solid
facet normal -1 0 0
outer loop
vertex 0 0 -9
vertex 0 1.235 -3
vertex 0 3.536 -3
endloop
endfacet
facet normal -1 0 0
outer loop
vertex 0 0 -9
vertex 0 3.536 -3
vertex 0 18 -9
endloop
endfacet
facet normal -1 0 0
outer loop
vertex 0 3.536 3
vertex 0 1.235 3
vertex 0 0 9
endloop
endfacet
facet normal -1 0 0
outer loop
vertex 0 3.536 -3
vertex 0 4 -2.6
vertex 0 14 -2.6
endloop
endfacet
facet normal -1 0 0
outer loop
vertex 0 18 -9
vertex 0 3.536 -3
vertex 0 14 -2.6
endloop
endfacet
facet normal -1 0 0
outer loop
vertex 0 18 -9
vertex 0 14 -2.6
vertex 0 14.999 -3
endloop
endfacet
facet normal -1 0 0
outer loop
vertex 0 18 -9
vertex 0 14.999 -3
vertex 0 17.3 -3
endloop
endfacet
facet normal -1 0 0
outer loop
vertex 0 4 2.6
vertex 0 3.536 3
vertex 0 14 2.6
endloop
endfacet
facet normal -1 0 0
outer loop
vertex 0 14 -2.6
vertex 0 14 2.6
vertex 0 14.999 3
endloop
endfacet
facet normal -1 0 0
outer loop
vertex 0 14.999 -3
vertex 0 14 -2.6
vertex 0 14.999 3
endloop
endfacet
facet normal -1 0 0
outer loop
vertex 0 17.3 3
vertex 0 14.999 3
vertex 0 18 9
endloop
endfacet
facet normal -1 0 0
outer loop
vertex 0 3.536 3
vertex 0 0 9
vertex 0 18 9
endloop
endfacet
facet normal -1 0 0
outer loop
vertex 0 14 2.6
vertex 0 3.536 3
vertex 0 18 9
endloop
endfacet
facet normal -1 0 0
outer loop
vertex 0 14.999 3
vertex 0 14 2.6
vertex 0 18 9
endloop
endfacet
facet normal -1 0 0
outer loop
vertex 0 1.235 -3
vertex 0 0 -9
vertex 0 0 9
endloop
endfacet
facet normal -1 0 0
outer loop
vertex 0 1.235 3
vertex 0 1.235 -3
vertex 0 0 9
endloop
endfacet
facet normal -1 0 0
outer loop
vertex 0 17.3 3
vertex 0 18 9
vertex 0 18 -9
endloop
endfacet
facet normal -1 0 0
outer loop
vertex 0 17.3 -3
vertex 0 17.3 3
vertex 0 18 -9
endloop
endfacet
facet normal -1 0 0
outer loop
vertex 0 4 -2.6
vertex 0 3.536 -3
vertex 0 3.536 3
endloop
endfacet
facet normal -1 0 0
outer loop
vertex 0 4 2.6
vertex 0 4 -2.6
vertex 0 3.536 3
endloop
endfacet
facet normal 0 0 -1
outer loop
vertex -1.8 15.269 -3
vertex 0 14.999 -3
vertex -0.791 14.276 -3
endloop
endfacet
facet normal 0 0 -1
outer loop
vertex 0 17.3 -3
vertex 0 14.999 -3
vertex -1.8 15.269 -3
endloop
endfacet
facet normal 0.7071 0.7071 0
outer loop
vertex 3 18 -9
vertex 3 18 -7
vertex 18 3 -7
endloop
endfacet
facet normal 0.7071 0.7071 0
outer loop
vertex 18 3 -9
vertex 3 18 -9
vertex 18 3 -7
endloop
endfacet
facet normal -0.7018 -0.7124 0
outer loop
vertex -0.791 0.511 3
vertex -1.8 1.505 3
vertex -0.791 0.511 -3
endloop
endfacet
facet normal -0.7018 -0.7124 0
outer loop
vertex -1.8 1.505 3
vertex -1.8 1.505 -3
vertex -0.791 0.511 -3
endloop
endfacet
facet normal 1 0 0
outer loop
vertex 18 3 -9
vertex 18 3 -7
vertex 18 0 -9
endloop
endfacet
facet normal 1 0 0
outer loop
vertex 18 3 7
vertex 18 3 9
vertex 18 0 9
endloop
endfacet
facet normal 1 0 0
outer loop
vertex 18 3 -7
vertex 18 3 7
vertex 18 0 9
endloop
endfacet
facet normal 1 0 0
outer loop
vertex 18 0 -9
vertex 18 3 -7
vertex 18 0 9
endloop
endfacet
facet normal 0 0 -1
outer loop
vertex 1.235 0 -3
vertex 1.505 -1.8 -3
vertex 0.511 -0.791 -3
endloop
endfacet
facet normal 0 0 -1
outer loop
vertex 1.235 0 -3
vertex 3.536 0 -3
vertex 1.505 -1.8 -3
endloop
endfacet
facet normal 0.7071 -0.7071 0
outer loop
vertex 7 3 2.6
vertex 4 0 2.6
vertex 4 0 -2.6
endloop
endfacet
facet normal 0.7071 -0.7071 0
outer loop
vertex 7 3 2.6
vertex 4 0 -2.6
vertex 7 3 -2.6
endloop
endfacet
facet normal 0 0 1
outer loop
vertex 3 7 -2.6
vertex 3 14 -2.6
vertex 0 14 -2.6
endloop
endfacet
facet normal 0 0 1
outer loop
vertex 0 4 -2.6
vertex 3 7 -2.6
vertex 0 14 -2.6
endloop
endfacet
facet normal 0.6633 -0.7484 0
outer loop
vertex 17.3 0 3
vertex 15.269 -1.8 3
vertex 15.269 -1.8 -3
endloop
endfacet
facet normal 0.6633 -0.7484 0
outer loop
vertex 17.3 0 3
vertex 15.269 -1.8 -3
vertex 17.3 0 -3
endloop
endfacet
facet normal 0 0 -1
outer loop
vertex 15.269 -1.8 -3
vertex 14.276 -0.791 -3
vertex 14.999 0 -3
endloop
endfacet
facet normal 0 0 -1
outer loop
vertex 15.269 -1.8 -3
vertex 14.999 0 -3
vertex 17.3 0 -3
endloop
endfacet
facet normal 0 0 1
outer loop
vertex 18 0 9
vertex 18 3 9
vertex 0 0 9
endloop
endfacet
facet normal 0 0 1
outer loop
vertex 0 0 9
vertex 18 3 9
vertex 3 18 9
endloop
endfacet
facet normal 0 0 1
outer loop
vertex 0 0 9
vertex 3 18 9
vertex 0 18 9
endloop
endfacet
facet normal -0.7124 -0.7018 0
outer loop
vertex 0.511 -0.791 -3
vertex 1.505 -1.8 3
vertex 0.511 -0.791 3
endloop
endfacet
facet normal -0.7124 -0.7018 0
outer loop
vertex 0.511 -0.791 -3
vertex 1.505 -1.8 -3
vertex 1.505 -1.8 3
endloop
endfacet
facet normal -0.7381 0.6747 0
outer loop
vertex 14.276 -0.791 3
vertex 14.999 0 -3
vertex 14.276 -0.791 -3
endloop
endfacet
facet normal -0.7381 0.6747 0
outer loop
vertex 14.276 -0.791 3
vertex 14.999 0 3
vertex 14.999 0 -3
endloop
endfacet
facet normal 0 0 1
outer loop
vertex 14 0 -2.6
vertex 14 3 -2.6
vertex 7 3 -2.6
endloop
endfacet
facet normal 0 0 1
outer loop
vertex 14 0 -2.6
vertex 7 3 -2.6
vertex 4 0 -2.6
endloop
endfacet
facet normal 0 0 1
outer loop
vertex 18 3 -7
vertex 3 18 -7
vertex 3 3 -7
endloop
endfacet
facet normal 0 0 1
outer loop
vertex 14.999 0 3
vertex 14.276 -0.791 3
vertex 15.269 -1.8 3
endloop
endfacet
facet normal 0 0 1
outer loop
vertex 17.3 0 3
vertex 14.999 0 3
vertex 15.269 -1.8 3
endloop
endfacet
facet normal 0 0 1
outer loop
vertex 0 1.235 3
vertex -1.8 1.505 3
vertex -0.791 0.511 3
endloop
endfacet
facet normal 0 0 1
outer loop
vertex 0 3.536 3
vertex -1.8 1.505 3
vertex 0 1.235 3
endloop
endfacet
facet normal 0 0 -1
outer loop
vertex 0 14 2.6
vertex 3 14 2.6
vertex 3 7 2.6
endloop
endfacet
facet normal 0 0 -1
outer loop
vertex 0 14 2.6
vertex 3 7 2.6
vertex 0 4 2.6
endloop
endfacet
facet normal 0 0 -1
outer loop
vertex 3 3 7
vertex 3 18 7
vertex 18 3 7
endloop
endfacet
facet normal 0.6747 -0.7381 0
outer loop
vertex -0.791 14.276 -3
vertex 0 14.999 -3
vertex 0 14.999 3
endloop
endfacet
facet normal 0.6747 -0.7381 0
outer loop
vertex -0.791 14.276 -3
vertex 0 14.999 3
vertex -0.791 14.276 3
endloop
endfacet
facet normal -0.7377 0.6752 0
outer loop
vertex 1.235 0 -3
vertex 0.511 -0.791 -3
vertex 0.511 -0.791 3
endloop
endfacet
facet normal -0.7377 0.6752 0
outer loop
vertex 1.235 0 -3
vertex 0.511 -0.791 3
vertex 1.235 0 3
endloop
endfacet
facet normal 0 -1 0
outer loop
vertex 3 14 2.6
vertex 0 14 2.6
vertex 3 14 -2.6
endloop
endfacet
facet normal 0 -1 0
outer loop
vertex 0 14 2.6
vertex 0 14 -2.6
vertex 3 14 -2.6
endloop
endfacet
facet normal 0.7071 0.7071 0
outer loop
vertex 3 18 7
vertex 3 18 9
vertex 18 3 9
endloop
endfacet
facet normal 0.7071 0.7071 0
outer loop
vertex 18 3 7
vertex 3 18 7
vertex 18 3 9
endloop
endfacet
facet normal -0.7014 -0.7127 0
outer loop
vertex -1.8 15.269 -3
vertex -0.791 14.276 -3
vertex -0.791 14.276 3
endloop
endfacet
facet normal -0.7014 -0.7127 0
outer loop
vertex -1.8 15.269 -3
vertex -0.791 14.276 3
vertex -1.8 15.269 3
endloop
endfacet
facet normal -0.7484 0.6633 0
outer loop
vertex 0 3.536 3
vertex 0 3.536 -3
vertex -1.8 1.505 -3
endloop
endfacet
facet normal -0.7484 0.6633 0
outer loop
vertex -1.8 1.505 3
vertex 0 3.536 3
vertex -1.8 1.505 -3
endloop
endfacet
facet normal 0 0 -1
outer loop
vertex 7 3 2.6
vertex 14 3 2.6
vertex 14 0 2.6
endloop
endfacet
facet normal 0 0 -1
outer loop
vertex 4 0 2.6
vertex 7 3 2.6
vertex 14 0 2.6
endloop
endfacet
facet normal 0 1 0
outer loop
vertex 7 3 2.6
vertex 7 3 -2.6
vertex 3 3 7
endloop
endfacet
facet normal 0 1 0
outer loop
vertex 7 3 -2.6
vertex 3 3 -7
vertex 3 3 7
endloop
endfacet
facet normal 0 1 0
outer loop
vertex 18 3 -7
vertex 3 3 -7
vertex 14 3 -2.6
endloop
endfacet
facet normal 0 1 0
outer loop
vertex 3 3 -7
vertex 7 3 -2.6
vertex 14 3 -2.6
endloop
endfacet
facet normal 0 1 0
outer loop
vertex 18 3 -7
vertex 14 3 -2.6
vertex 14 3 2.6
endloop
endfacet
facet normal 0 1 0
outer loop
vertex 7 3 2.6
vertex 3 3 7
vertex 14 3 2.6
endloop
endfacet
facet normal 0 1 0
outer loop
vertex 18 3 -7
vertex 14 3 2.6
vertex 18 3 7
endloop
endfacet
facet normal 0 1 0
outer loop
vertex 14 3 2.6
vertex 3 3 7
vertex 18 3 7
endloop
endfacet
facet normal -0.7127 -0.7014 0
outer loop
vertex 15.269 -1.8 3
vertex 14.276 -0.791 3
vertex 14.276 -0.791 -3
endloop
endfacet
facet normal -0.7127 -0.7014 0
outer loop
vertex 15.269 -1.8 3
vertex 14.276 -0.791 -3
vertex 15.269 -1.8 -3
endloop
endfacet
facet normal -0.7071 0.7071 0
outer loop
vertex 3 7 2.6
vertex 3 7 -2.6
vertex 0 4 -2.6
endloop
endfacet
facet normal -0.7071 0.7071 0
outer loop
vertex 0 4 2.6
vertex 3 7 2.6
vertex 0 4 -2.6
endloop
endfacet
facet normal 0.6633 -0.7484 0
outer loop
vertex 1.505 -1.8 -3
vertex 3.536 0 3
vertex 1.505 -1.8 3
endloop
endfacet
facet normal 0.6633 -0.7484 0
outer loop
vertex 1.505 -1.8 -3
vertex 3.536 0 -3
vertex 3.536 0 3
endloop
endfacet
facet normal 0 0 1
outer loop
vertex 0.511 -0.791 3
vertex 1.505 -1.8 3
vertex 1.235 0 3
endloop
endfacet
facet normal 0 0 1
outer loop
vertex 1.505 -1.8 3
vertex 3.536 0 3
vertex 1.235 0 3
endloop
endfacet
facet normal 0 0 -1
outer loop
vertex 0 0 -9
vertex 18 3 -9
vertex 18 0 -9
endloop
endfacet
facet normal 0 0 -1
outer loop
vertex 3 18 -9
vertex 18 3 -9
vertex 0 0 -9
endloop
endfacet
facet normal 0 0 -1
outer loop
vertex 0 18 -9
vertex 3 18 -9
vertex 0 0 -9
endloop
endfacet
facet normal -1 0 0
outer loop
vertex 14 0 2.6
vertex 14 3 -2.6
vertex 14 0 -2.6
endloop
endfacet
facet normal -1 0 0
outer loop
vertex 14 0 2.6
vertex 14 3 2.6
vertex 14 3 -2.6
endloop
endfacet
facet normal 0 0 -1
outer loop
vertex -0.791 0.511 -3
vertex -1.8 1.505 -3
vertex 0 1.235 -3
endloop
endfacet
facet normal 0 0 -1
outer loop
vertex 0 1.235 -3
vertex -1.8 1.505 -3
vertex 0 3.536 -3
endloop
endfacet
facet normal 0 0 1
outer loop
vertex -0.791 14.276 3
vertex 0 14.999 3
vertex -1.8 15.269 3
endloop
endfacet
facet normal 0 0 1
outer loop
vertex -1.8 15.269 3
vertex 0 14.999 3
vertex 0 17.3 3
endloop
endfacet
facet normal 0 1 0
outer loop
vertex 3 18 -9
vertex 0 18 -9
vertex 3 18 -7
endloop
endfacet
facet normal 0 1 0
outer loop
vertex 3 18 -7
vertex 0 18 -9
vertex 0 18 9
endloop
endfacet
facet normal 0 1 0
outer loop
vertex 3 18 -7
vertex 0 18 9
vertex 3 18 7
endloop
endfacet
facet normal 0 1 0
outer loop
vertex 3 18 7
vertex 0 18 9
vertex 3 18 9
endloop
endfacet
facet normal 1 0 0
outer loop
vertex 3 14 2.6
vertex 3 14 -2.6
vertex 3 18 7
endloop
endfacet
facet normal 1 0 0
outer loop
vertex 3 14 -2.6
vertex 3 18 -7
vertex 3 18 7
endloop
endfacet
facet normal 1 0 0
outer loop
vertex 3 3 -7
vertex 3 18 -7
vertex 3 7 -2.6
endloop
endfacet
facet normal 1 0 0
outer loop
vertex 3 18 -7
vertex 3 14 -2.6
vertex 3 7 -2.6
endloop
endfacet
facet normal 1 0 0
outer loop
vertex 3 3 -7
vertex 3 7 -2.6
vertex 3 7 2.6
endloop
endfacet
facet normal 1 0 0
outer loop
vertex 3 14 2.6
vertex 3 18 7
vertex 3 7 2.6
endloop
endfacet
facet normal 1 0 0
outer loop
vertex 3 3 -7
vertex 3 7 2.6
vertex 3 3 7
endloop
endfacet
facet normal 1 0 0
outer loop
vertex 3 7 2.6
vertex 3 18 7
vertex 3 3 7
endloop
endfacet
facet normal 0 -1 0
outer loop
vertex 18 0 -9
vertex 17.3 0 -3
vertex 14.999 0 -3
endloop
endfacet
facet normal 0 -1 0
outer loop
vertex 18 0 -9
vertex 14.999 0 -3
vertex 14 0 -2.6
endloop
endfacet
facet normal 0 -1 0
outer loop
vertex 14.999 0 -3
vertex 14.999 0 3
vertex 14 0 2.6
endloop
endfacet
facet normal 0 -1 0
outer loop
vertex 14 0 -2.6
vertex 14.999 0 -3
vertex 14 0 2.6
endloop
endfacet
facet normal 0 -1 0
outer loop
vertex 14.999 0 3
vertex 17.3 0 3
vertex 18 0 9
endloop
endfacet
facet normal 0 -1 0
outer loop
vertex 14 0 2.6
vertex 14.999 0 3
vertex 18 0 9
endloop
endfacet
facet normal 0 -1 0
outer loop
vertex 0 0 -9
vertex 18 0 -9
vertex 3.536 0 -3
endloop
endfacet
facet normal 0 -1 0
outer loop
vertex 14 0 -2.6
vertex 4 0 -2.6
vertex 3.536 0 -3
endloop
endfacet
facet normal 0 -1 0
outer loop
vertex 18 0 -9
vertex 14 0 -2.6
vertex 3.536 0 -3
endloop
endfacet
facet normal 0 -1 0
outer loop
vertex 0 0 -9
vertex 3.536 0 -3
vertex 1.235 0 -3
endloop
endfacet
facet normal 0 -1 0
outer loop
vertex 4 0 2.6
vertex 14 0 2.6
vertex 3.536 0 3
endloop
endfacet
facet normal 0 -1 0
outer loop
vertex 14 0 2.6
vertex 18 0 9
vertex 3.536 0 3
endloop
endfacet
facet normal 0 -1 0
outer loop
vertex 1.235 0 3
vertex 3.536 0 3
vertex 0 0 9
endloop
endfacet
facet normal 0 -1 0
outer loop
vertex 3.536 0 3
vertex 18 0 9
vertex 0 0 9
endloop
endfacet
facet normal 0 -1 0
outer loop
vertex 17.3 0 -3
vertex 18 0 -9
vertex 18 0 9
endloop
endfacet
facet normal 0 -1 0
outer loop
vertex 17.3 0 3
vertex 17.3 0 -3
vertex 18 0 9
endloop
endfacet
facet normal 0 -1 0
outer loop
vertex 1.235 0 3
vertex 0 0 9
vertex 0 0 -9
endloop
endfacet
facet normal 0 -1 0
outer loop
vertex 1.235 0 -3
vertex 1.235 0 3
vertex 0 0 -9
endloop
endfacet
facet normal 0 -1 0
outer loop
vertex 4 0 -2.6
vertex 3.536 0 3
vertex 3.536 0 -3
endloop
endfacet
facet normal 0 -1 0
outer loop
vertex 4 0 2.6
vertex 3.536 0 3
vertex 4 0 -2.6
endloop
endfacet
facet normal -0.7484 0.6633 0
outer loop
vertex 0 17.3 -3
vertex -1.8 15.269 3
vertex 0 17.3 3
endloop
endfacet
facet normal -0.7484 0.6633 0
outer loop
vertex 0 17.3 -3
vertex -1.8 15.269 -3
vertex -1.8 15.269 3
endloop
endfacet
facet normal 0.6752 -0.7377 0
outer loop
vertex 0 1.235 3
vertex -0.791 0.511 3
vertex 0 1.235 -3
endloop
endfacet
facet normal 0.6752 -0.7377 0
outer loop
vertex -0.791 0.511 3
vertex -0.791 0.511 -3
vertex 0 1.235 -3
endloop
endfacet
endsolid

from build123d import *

# Parameters (mm, degrees)
BOSS_EXTRUDE1_DEPTH = 9
CUT_EXTRUDE1_DEPTH  = 7
CUT_EXTRUDE2_DEPTH  = 2.6
BOSS_EXTRUDE2_DEPTH = 3


with BuildPart() as part:
    # Sketch1 → Boss-Extrude1 (new, symmetric)
    with BuildSketch(Plane.XY):
        Polygon((0, 0), (0, 18), (3, 18), (18, 3), (18, 0), align=None)
    extrude(amount=BOSS_EXTRUDE1_DEPTH, both=True)

    # Sketch2 → Cut-Extrude1 (cut, symmetric)
    with BuildSketch(Plane.XY):
        Polygon((3, 18), (3, 3), (18, 3), align=None)
    extrude(amount=CUT_EXTRUDE1_DEPTH, both=True, mode=Mode.SUBTRACT)

    # Sketch3 → Cut-Extrude2 (cut, symmetric)
    with BuildSketch(Plane.XY):
        Polygon((0, 14), (3, 14), (3, 7), (0, 4), align=None)
        Polygon((7, 3), (14, 3), (14, 0), (4, 0), align=None)
    extrude(amount=CUT_EXTRUDE2_DEPTH, both=True, mode=Mode.SUBTRACT)

    # Sketch4 → Boss-Extrude2 (add, symmetric)
    with BuildSketch(Plane.XY):
        Polygon((1.504575227, -1.8), (0.511249685, -0.790946088), (1.234750477, 0), (3.535533906, 0), align=None)
        Polygon((0, 3.535533906), (-1.8, 1.504575227), (-0.790946088, 0.511249685), (0, 1.234750477), align=None)
        Polygon((0, 17.3), (0, 14.999216572), (-0.790946088, 14.275715779), (-1.8, 15.269041321), align=None)
        Polygon((14.999216572, 0), (14.275715779, -0.790946088), (15.269041321, -1.8), (17.3, 0), align=None)
    extrude(amount=BOSS_EXTRUDE2_DEPTH, both=True)


solid = part.part
